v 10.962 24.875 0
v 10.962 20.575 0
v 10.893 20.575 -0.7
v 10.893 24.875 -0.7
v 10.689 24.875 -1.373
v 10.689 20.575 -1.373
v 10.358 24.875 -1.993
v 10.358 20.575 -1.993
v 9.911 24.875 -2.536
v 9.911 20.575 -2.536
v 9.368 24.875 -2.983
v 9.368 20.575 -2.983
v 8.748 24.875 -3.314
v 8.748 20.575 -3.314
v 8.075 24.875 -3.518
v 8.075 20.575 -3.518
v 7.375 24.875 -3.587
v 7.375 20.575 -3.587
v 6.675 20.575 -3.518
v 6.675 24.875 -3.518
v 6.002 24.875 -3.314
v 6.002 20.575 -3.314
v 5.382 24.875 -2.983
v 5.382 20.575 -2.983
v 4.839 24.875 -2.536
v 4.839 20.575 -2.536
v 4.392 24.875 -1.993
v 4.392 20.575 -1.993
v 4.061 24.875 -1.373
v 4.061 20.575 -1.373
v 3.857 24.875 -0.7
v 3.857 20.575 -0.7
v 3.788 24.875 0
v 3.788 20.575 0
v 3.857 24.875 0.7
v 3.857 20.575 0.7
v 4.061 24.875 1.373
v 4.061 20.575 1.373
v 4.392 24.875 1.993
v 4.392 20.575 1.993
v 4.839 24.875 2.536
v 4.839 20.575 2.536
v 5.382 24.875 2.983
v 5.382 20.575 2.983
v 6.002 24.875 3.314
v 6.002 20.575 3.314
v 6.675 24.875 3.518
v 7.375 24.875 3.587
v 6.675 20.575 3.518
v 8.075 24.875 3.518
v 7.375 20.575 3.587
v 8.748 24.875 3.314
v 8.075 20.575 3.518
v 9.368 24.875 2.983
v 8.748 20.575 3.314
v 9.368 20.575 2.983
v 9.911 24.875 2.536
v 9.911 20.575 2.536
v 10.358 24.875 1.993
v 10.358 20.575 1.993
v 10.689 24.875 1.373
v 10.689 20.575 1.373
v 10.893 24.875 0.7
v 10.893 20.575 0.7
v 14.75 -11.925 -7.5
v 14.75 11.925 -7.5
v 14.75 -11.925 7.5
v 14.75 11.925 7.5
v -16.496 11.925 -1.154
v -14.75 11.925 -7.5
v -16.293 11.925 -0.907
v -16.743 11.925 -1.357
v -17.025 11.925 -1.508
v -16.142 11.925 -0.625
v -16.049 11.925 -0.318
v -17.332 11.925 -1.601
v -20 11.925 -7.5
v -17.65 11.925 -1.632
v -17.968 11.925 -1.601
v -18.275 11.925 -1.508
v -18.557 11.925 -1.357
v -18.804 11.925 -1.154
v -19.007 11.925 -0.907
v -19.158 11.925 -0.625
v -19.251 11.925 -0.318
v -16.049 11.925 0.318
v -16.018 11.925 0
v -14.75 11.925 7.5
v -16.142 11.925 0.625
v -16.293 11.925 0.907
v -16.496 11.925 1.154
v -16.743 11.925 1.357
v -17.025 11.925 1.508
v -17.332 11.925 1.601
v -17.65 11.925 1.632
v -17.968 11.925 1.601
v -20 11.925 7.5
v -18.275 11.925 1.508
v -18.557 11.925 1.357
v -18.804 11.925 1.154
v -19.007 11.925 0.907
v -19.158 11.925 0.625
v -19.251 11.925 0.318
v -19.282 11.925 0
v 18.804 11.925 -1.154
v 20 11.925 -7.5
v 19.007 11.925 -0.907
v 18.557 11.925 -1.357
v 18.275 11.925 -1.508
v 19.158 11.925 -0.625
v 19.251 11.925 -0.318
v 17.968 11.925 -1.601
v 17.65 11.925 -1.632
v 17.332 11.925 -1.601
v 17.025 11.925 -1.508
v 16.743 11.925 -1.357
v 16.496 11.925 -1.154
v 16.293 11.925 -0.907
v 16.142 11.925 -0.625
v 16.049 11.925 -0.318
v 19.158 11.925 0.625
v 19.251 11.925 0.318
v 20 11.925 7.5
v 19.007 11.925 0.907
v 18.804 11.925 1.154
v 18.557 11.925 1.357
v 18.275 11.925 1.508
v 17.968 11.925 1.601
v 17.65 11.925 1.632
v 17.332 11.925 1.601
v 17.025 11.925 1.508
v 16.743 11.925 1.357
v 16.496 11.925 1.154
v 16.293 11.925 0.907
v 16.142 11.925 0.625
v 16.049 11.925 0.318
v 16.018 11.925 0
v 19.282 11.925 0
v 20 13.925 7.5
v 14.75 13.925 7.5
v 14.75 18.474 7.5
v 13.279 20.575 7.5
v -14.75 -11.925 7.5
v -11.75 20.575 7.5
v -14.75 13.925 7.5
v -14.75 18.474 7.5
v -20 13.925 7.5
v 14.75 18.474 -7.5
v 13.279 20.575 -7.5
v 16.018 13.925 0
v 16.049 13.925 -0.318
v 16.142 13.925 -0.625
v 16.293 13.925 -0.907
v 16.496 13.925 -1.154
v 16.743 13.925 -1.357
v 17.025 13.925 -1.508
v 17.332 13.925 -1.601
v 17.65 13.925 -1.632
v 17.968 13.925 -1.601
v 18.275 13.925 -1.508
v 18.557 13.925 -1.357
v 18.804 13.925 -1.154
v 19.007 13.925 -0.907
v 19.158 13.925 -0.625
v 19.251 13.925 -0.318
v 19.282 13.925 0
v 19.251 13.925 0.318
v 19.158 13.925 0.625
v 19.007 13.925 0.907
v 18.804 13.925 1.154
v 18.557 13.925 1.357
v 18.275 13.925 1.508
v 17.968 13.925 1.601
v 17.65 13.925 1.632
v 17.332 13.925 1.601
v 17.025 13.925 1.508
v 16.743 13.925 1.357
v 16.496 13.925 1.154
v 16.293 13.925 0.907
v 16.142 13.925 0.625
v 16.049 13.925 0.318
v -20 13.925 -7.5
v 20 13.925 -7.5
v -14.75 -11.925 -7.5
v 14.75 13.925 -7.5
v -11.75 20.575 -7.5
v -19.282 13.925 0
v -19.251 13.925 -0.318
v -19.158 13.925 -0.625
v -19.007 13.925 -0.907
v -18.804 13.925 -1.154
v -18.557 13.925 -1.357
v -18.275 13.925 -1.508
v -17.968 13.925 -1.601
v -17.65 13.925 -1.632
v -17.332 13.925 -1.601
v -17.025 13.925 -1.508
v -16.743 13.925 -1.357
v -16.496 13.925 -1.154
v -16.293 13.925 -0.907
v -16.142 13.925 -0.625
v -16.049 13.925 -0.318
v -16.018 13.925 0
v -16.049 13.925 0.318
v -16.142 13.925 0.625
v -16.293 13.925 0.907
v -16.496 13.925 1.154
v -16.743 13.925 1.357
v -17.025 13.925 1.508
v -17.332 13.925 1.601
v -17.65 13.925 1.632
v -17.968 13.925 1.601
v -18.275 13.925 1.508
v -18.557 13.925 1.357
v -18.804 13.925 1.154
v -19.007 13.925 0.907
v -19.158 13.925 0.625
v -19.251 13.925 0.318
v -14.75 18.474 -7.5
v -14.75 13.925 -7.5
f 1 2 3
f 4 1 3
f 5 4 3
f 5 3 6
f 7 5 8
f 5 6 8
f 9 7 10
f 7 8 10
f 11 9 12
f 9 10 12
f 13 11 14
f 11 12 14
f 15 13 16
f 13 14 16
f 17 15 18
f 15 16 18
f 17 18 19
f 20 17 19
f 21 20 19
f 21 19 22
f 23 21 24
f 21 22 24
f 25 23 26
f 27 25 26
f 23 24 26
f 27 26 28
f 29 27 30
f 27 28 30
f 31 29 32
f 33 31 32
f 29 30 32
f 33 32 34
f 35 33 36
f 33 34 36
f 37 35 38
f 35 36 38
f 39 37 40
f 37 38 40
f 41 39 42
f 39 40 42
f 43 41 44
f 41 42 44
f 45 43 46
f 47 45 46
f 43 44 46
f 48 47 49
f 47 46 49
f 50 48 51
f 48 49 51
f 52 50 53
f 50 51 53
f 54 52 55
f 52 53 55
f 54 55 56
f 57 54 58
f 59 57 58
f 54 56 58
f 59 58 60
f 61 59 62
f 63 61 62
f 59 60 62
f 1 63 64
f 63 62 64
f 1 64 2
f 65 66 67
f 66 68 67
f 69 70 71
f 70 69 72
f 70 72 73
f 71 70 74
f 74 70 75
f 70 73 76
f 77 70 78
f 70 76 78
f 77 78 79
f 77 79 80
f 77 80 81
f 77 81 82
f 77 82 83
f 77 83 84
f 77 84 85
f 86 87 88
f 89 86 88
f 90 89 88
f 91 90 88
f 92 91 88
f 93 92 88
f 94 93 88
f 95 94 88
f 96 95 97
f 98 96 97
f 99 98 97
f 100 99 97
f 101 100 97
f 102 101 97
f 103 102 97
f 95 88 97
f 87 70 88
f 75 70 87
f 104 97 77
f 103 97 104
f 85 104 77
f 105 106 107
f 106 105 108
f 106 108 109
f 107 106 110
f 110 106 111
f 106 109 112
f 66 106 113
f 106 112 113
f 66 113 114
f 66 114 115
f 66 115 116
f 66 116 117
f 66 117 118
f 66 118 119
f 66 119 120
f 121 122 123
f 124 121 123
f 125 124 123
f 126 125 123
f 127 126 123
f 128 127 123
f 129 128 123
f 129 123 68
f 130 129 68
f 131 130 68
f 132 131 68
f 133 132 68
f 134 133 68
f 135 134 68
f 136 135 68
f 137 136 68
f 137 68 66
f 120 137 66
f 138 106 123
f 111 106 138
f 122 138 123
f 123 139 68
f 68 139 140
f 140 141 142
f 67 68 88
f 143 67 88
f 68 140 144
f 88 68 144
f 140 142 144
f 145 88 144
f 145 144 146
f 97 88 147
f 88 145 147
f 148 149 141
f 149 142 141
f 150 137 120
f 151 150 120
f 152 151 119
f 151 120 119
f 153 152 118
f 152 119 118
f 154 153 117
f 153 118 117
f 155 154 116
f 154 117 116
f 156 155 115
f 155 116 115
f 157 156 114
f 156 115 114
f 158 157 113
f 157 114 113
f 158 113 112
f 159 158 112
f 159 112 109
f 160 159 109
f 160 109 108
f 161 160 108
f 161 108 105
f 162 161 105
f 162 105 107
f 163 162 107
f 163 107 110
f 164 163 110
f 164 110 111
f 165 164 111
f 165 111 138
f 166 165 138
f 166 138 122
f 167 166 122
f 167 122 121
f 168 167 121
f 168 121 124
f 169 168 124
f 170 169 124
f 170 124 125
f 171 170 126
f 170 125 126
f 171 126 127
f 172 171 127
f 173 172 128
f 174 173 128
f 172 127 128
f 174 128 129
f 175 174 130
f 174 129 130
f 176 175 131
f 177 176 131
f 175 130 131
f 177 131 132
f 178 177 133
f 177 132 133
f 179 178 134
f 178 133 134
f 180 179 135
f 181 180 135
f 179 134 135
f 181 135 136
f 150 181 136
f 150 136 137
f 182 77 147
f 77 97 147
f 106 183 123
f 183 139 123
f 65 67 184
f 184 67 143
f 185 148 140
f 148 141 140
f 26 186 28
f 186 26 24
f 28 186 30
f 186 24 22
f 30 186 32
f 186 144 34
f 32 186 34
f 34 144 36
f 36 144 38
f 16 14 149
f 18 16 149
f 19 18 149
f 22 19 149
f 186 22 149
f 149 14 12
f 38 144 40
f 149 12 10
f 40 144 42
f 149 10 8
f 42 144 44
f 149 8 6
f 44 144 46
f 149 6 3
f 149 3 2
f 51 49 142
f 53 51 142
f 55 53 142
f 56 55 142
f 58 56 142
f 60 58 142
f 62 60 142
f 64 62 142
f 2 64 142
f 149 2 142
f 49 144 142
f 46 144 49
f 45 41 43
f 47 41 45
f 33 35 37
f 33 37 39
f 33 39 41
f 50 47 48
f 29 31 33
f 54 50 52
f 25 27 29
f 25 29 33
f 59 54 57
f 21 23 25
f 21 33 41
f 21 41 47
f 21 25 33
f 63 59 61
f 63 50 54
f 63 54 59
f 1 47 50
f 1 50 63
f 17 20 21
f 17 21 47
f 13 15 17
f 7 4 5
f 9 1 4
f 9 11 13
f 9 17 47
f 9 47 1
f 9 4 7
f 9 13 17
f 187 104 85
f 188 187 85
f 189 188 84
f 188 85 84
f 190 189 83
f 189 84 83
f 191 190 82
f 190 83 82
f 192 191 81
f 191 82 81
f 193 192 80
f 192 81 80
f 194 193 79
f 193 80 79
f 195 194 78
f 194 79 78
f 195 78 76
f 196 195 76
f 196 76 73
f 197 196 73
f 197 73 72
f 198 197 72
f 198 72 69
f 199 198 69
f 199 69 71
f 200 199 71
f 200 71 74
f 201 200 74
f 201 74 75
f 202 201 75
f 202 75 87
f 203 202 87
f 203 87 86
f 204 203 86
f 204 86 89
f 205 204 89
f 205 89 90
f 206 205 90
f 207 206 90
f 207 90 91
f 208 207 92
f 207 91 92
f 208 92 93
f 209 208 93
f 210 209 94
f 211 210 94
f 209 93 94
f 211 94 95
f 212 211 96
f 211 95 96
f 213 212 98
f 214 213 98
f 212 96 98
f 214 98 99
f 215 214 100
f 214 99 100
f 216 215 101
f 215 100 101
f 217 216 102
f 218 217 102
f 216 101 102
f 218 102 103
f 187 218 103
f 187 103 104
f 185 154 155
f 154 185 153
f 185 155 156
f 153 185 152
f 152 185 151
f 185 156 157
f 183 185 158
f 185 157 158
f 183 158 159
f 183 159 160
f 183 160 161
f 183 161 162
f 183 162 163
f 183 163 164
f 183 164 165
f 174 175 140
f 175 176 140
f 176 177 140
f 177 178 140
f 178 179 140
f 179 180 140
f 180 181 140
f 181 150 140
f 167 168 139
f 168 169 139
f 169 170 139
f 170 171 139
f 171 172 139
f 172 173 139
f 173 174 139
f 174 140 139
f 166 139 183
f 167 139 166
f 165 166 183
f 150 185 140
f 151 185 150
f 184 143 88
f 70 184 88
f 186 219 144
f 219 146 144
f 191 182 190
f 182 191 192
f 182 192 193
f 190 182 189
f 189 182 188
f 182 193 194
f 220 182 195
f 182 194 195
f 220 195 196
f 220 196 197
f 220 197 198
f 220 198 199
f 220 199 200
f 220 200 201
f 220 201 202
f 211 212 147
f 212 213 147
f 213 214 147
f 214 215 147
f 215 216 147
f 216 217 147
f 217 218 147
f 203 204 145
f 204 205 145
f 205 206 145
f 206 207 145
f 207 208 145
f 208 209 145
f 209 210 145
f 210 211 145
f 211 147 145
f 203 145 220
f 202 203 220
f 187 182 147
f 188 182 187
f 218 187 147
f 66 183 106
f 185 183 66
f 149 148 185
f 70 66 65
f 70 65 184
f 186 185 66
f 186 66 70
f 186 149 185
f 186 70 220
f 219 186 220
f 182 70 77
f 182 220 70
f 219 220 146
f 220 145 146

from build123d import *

# Parameters (mm, degrees)
BOSS_EXTRUDE1_DEPTH       = 7.5
SKETCH2_R                 = 3.587141307
BOSS_EXTRUDE2_DEPTH       = 4.3
F_4_CLEARANCE_HOLE1_D     = 3.2639
F_4_CLEARANCE_HOLE1_DEPTH = 5.84
F_4_CLEARANCE_HOLE1_TIP   = 0.980574487


with BuildPart() as part:
    # Sketch1 → Boss-Extrude1 (new, symmetric)
    with BuildSketch(Plane.XY):
        Polygon((-14.75, 11.925), (-20, 11.925), (-20, 13.925), (-14.75, 13.925), (-14.75, 18.474377385), (-11.75, 20.575), (13.27912821, 20.575), (14.75, 18.474377385), (14.75, 13.925), (20, 13.925), (20, 11.925), (14.75, 11.925), (14.75, -11.925), (-14.75, -11.925), align=None)
    extrude(amount=BOSS_EXTRUDE1_DEPTH, both=True)

    # Sketch2 → Boss-Extrude2 (add)
    with BuildSketch(Plane(origin=(0, 20.575, 0), x_dir=(1, 0, 0), z_dir=(0, 1, 0))):
        with Locations((7.375, 0)):
            Circle(SKETCH2_R)
    extrude(amount=BOSS_EXTRUDE2_DEPTH)

    # #4 Clearance Hole1
    with Locations(Plane(origin=(0, 13.925, 0), x_dir=(1, 0, 0), z_dir=(0, 1, 0))):
        with Locations((-17.65, 0), (17.65, 0)):
            Hole(F_4_CLEARANCE_HOLE1_D / 2, depth=F_4_CLEARANCE_HOLE1_DEPTH)
            with Locations((0, 0, -(F_4_CLEARANCE_HOLE1_DEPTH + F_4_CLEARANCE_HOLE1_TIP / 2))):  # 118° drill point
                Cone(0, F_4_CLEARANCE_HOLE1_D / 2, F_4_CLEARANCE_HOLE1_TIP, mode=Mode.SUBTRACT)


solid = part.part
